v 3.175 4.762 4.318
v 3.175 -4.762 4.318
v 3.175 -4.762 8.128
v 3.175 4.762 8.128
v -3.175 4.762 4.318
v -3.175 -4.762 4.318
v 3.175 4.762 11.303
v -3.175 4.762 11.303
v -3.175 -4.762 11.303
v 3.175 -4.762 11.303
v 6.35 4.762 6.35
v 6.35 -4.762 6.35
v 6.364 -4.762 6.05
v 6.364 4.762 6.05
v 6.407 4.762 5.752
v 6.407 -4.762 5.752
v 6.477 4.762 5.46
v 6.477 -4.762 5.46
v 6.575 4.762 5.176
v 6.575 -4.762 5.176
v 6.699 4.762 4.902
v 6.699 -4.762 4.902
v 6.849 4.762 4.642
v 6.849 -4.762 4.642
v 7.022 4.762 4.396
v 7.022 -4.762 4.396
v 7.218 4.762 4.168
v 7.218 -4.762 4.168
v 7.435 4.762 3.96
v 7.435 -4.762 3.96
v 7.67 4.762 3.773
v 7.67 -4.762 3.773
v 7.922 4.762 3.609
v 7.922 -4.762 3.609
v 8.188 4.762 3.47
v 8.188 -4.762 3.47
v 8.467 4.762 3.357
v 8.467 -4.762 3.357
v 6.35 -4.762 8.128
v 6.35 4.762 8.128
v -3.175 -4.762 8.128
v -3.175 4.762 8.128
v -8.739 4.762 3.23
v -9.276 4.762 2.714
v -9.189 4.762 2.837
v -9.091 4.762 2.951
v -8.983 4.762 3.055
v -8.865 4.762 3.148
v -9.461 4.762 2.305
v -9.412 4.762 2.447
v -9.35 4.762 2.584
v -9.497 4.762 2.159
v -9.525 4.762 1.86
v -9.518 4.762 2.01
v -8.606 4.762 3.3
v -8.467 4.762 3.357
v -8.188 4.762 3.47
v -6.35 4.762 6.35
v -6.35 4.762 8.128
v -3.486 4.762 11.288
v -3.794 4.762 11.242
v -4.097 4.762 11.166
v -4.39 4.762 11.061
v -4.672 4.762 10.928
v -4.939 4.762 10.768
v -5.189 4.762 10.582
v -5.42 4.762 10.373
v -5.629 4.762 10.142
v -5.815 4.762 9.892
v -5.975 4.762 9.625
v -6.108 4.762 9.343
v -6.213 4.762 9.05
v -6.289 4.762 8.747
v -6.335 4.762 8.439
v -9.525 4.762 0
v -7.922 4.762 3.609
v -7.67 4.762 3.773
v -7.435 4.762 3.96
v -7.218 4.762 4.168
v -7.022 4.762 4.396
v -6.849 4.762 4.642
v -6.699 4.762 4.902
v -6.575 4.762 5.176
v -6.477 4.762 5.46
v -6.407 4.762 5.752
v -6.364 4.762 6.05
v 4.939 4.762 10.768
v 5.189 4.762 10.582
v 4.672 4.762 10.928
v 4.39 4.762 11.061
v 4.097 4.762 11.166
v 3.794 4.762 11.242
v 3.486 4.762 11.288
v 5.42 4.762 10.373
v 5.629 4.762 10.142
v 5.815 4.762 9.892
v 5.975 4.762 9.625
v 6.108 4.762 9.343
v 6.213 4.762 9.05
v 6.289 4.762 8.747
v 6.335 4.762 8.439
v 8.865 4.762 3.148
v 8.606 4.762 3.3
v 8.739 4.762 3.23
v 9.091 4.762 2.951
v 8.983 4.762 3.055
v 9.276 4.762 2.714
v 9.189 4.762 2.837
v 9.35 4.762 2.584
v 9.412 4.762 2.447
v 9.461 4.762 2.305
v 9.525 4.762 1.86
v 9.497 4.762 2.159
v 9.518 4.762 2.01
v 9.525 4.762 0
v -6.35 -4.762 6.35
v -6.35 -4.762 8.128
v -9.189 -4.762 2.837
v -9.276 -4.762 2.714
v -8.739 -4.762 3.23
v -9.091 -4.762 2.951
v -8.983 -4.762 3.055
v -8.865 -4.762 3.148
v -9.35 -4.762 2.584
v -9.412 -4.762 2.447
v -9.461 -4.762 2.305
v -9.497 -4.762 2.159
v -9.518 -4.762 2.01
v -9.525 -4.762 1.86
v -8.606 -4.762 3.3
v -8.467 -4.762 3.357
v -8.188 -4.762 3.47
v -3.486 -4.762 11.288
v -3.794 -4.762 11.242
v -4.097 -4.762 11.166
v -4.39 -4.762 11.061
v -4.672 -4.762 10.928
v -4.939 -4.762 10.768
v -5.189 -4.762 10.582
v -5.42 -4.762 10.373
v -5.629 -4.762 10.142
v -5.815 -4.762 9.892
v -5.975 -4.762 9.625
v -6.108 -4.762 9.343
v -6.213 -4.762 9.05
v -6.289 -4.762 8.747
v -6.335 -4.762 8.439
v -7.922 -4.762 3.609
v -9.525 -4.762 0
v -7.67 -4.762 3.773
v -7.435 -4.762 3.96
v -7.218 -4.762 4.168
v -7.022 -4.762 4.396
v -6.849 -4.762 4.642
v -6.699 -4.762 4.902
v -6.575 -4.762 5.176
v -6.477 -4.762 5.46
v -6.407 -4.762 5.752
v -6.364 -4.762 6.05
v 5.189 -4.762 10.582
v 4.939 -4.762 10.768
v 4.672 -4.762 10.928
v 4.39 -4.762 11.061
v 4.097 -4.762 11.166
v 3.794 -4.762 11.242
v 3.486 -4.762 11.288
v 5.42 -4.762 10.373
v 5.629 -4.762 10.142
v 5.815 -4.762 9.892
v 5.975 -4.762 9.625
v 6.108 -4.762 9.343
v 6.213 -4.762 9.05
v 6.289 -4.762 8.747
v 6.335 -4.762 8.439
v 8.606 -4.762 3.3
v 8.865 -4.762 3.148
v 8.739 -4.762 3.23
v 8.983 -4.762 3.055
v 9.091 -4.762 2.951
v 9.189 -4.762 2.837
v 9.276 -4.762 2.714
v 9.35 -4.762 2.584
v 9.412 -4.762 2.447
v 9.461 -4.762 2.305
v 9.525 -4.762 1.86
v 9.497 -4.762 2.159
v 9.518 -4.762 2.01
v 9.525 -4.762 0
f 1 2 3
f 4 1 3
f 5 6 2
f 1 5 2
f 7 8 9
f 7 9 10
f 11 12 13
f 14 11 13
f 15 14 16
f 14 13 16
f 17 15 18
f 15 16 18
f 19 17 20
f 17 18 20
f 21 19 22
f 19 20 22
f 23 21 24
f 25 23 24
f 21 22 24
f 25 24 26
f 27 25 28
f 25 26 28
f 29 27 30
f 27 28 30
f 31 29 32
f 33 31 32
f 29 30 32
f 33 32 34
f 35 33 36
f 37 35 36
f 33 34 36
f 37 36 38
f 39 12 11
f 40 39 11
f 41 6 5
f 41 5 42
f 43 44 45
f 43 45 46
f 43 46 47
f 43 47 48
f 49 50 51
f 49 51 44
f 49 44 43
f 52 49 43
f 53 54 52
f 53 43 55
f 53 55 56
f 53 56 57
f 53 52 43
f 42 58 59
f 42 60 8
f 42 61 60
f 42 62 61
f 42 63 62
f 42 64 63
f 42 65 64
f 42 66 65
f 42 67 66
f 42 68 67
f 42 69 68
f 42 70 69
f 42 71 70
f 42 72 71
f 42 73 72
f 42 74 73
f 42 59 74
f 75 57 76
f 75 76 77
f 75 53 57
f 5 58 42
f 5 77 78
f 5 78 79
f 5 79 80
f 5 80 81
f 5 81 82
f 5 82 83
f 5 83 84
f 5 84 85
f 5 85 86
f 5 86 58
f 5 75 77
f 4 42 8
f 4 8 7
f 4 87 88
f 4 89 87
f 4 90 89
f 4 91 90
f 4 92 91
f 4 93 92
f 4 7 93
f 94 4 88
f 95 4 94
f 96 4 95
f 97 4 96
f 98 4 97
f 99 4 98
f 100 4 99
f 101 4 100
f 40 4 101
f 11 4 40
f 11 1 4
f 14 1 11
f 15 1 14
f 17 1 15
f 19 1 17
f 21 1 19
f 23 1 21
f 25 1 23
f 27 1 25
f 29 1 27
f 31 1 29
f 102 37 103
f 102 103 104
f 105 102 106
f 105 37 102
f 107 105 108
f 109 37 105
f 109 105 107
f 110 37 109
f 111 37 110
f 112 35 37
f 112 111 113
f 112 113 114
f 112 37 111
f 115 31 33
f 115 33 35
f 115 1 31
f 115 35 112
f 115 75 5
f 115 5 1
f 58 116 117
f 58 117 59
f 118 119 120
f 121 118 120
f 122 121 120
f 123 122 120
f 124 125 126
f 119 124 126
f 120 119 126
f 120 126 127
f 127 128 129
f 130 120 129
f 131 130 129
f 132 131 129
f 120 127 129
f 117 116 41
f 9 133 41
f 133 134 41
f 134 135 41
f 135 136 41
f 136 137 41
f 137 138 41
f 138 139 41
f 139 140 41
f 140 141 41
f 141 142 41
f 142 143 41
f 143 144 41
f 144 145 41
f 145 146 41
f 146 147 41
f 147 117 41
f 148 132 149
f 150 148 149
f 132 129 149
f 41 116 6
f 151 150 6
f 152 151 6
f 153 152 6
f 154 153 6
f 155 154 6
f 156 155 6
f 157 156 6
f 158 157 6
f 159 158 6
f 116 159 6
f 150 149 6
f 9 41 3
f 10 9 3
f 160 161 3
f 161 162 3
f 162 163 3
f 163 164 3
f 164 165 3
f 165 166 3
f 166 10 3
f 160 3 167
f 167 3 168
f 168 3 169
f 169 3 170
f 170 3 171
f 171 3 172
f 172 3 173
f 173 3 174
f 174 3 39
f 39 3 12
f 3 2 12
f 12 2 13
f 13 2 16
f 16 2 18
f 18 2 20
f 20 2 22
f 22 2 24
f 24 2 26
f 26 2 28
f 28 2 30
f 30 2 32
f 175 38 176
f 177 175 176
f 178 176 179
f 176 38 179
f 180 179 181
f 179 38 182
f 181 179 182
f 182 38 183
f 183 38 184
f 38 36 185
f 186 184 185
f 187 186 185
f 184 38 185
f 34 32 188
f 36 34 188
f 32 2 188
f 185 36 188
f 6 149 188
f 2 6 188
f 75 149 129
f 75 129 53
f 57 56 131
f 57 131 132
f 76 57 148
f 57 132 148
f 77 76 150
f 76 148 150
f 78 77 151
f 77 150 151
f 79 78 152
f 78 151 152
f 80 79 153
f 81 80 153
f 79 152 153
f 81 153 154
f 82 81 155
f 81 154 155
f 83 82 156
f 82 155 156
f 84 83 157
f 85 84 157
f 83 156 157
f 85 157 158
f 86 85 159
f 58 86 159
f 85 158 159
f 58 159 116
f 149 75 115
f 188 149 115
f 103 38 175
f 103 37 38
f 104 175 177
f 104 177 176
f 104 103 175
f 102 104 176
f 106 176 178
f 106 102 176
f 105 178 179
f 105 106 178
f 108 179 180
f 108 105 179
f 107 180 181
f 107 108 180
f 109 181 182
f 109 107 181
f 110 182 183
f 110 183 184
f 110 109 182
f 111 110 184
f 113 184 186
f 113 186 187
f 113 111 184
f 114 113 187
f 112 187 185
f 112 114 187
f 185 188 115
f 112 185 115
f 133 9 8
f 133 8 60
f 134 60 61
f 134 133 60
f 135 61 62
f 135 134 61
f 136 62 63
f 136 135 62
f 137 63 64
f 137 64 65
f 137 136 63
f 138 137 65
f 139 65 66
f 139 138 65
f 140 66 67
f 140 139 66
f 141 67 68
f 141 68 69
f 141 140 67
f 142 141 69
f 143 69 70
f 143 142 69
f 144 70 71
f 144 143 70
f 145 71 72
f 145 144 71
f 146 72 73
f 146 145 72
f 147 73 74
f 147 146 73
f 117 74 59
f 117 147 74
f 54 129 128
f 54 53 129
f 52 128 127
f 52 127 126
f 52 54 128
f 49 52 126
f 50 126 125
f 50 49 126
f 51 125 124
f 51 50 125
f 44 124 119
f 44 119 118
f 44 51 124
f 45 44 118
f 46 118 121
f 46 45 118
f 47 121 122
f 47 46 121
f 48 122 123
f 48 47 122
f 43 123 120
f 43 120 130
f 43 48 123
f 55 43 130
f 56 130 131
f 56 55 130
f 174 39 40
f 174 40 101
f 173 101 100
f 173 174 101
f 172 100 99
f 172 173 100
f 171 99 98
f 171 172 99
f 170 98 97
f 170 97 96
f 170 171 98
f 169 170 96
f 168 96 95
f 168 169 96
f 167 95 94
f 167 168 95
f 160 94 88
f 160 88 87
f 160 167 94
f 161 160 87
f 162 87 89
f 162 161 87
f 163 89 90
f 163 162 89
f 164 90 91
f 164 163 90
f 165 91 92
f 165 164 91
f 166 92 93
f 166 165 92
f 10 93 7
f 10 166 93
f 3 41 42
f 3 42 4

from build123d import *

# Parameters (mm, degrees)
SKETCH1_W           = 19.05
SKETCH1_H           = 9.525
BOSS_EXTRUDE1_DEPTH = 3.175
SKETCH2_W           = 12.7
SKETCH2_H           = 9.525
BOSS_EXTRUDE2_DEPTH = 8.128
SKETCH3_W           = 6.35
SKETCH3_H           = 3.81
CUT_EXTRUDE1_DEPTH  = 18.584341301
FILLET1_START       = -4.7625
FILLET1_DEPTH       = 9.525
FILLET1_2_DEPTH     = 9.525
FILLET2_R           = 1.5875


with BuildPart() as part:
    # Sketch1 → Boss-Extrude1 (new body)
    with BuildSketch(Plane.XY):
        Rectangle(SKETCH1_W, SKETCH1_H)
    extrude(amount=BOSS_EXTRUDE1_DEPTH)

    # Sketch2 → Boss-Extrude2 (add)
    with BuildSketch(Plane.XY.offset(3.175)):
        Rectangle(SKETCH2_W, SKETCH2_H)
    extrude(amount=BOSS_EXTRUDE2_DEPTH)

    # Sketch3 → Cut-Extrude1 (cut, through all)
    with BuildSketch(Plane.XZ.offset(4.7625)):
        with Locations((0, 6.223)):
            Rectangle(SKETCH3_W, SKETCH3_H)
    extrude(amount=-CUT_EXTRUDE1_DEPTH, mode=Mode.SUBTRACT)

    # Fillet1: read off the stored shape, not the designer's step
    # Fillet1 outline → Fillet1 (cut)
    with BuildSketch(Plane(origin=(0, 0, 0), x_dir=(1, 0, 0), z_dir=(0, 1, 0)).offset(FILLET1_START)):
        with BuildLine():
            ThreePointArc((6.35, -8.128), (5.42006403, -10.37306403), (3.175, -11.303))
            Line((3.175, -11.303), (6.35, -11.303))
            Line((6.35, -11.303), (6.35, -8.128))
        make_face()
        with BuildLine():
            ThreePointArc((-3.175, -11.303), (-5.42006403, -10.37306403), (-6.35, -8.128))
            Line((-6.35, -8.128), (-6.35, -11.303))
            Line((-6.35, -11.303), (-3.175, -11.303))
        make_face()
    extrude(amount=FILLET1_DEPTH, mode=Mode.SUBTRACT)

    # Fillet1 2 outline → Fillet1 2 (add)
    with BuildSketch(Plane(origin=(0, 0, 0), x_dir=(1, 0, 0), z_dir=(0, 1, 0)).offset(FILLET1_START)):
        with BuildLine():
            Line((6.35, -3.175), (6.35, -6.35))
            ThreePointArc((6.35, -6.35), (7.27993597, -4.10493597), (9.525, -3.175))
            Line((9.525, -3.175), (6.35, -3.175))
        make_face()
        with BuildLine():
            ThreePointArc((-9.525, -3.175), (-7.27993597, -4.10493597), (-6.35, -6.35))
            Line((-6.35, -6.35), (-6.35, -3.175))
            Line((-6.35, -3.175), (-9.525, -3.175))
        make_face()
    extrude(amount=FILLET1_2_DEPTH)

    # Fillet2
    fillet2_edges = [part.edges().sort_by_distance(p)[0] for p in [
        (-9.525, 0, 3.175),
        (9.525, 0, 3.175),
    ]]
    fillet(fillet2_edges, radius=FILLET2_R)


solid = part.part
